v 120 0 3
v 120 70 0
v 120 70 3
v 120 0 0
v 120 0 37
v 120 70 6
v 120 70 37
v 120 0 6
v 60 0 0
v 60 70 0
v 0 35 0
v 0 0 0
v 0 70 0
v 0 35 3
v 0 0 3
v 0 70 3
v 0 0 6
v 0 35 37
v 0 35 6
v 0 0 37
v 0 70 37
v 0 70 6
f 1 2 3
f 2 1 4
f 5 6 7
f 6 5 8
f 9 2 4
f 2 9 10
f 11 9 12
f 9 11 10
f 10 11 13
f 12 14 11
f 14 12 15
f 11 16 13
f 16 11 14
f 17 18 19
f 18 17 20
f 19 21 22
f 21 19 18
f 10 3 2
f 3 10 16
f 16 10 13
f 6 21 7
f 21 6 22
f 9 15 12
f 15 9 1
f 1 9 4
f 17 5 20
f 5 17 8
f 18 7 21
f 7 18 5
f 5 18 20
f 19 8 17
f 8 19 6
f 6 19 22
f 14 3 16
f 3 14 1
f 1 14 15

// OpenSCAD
// Reservoir - a rectangular open-top tank with a raised floor and a solid platform that divides
// the bottom into two buffer chambers. Each end wall gets a horizontal X-running hole for an
// electrode wire. NOVEL general part (a generic reservoir, not any one labware item).
//

L   = 120;
W   = 70;
H   = 40;
wall = 3;
floor = 3;
platform_L = 60;
platform_h = 10;
wire_d = 2;

$fn = 64;

inner_H = H - wall;                 // open top, so the inner space goes up to z = H - wall
platform_z = floor + platform_h;   // top of the raised floor in each chamber

difference() {
    cube([L, W, H]);
    translate([0, 0, H - wall]) cube([L, W, wall]);              // cut the open-top cavity
    translate([0, 0, floor]) cube([L, W, floor]);                 // remove the floor, leaving two chambers
    translate([0, W / 2, floor]) cube([L, W, floor]);             // remove the floor on the other side too
    translate([-L / 2, W / 2, 0]) cube([platform_L, W, H - wall]);  // remove the space above the platform (a shelf the gel tray sits on)
    for (x = [-L / 2, L / 2])
        translate([x, 0, -1]) rotate([-90, 0, 0]) cylinder(h = W + 2, d = wire_d);   // horizontal X-running hole in each end wall
}
